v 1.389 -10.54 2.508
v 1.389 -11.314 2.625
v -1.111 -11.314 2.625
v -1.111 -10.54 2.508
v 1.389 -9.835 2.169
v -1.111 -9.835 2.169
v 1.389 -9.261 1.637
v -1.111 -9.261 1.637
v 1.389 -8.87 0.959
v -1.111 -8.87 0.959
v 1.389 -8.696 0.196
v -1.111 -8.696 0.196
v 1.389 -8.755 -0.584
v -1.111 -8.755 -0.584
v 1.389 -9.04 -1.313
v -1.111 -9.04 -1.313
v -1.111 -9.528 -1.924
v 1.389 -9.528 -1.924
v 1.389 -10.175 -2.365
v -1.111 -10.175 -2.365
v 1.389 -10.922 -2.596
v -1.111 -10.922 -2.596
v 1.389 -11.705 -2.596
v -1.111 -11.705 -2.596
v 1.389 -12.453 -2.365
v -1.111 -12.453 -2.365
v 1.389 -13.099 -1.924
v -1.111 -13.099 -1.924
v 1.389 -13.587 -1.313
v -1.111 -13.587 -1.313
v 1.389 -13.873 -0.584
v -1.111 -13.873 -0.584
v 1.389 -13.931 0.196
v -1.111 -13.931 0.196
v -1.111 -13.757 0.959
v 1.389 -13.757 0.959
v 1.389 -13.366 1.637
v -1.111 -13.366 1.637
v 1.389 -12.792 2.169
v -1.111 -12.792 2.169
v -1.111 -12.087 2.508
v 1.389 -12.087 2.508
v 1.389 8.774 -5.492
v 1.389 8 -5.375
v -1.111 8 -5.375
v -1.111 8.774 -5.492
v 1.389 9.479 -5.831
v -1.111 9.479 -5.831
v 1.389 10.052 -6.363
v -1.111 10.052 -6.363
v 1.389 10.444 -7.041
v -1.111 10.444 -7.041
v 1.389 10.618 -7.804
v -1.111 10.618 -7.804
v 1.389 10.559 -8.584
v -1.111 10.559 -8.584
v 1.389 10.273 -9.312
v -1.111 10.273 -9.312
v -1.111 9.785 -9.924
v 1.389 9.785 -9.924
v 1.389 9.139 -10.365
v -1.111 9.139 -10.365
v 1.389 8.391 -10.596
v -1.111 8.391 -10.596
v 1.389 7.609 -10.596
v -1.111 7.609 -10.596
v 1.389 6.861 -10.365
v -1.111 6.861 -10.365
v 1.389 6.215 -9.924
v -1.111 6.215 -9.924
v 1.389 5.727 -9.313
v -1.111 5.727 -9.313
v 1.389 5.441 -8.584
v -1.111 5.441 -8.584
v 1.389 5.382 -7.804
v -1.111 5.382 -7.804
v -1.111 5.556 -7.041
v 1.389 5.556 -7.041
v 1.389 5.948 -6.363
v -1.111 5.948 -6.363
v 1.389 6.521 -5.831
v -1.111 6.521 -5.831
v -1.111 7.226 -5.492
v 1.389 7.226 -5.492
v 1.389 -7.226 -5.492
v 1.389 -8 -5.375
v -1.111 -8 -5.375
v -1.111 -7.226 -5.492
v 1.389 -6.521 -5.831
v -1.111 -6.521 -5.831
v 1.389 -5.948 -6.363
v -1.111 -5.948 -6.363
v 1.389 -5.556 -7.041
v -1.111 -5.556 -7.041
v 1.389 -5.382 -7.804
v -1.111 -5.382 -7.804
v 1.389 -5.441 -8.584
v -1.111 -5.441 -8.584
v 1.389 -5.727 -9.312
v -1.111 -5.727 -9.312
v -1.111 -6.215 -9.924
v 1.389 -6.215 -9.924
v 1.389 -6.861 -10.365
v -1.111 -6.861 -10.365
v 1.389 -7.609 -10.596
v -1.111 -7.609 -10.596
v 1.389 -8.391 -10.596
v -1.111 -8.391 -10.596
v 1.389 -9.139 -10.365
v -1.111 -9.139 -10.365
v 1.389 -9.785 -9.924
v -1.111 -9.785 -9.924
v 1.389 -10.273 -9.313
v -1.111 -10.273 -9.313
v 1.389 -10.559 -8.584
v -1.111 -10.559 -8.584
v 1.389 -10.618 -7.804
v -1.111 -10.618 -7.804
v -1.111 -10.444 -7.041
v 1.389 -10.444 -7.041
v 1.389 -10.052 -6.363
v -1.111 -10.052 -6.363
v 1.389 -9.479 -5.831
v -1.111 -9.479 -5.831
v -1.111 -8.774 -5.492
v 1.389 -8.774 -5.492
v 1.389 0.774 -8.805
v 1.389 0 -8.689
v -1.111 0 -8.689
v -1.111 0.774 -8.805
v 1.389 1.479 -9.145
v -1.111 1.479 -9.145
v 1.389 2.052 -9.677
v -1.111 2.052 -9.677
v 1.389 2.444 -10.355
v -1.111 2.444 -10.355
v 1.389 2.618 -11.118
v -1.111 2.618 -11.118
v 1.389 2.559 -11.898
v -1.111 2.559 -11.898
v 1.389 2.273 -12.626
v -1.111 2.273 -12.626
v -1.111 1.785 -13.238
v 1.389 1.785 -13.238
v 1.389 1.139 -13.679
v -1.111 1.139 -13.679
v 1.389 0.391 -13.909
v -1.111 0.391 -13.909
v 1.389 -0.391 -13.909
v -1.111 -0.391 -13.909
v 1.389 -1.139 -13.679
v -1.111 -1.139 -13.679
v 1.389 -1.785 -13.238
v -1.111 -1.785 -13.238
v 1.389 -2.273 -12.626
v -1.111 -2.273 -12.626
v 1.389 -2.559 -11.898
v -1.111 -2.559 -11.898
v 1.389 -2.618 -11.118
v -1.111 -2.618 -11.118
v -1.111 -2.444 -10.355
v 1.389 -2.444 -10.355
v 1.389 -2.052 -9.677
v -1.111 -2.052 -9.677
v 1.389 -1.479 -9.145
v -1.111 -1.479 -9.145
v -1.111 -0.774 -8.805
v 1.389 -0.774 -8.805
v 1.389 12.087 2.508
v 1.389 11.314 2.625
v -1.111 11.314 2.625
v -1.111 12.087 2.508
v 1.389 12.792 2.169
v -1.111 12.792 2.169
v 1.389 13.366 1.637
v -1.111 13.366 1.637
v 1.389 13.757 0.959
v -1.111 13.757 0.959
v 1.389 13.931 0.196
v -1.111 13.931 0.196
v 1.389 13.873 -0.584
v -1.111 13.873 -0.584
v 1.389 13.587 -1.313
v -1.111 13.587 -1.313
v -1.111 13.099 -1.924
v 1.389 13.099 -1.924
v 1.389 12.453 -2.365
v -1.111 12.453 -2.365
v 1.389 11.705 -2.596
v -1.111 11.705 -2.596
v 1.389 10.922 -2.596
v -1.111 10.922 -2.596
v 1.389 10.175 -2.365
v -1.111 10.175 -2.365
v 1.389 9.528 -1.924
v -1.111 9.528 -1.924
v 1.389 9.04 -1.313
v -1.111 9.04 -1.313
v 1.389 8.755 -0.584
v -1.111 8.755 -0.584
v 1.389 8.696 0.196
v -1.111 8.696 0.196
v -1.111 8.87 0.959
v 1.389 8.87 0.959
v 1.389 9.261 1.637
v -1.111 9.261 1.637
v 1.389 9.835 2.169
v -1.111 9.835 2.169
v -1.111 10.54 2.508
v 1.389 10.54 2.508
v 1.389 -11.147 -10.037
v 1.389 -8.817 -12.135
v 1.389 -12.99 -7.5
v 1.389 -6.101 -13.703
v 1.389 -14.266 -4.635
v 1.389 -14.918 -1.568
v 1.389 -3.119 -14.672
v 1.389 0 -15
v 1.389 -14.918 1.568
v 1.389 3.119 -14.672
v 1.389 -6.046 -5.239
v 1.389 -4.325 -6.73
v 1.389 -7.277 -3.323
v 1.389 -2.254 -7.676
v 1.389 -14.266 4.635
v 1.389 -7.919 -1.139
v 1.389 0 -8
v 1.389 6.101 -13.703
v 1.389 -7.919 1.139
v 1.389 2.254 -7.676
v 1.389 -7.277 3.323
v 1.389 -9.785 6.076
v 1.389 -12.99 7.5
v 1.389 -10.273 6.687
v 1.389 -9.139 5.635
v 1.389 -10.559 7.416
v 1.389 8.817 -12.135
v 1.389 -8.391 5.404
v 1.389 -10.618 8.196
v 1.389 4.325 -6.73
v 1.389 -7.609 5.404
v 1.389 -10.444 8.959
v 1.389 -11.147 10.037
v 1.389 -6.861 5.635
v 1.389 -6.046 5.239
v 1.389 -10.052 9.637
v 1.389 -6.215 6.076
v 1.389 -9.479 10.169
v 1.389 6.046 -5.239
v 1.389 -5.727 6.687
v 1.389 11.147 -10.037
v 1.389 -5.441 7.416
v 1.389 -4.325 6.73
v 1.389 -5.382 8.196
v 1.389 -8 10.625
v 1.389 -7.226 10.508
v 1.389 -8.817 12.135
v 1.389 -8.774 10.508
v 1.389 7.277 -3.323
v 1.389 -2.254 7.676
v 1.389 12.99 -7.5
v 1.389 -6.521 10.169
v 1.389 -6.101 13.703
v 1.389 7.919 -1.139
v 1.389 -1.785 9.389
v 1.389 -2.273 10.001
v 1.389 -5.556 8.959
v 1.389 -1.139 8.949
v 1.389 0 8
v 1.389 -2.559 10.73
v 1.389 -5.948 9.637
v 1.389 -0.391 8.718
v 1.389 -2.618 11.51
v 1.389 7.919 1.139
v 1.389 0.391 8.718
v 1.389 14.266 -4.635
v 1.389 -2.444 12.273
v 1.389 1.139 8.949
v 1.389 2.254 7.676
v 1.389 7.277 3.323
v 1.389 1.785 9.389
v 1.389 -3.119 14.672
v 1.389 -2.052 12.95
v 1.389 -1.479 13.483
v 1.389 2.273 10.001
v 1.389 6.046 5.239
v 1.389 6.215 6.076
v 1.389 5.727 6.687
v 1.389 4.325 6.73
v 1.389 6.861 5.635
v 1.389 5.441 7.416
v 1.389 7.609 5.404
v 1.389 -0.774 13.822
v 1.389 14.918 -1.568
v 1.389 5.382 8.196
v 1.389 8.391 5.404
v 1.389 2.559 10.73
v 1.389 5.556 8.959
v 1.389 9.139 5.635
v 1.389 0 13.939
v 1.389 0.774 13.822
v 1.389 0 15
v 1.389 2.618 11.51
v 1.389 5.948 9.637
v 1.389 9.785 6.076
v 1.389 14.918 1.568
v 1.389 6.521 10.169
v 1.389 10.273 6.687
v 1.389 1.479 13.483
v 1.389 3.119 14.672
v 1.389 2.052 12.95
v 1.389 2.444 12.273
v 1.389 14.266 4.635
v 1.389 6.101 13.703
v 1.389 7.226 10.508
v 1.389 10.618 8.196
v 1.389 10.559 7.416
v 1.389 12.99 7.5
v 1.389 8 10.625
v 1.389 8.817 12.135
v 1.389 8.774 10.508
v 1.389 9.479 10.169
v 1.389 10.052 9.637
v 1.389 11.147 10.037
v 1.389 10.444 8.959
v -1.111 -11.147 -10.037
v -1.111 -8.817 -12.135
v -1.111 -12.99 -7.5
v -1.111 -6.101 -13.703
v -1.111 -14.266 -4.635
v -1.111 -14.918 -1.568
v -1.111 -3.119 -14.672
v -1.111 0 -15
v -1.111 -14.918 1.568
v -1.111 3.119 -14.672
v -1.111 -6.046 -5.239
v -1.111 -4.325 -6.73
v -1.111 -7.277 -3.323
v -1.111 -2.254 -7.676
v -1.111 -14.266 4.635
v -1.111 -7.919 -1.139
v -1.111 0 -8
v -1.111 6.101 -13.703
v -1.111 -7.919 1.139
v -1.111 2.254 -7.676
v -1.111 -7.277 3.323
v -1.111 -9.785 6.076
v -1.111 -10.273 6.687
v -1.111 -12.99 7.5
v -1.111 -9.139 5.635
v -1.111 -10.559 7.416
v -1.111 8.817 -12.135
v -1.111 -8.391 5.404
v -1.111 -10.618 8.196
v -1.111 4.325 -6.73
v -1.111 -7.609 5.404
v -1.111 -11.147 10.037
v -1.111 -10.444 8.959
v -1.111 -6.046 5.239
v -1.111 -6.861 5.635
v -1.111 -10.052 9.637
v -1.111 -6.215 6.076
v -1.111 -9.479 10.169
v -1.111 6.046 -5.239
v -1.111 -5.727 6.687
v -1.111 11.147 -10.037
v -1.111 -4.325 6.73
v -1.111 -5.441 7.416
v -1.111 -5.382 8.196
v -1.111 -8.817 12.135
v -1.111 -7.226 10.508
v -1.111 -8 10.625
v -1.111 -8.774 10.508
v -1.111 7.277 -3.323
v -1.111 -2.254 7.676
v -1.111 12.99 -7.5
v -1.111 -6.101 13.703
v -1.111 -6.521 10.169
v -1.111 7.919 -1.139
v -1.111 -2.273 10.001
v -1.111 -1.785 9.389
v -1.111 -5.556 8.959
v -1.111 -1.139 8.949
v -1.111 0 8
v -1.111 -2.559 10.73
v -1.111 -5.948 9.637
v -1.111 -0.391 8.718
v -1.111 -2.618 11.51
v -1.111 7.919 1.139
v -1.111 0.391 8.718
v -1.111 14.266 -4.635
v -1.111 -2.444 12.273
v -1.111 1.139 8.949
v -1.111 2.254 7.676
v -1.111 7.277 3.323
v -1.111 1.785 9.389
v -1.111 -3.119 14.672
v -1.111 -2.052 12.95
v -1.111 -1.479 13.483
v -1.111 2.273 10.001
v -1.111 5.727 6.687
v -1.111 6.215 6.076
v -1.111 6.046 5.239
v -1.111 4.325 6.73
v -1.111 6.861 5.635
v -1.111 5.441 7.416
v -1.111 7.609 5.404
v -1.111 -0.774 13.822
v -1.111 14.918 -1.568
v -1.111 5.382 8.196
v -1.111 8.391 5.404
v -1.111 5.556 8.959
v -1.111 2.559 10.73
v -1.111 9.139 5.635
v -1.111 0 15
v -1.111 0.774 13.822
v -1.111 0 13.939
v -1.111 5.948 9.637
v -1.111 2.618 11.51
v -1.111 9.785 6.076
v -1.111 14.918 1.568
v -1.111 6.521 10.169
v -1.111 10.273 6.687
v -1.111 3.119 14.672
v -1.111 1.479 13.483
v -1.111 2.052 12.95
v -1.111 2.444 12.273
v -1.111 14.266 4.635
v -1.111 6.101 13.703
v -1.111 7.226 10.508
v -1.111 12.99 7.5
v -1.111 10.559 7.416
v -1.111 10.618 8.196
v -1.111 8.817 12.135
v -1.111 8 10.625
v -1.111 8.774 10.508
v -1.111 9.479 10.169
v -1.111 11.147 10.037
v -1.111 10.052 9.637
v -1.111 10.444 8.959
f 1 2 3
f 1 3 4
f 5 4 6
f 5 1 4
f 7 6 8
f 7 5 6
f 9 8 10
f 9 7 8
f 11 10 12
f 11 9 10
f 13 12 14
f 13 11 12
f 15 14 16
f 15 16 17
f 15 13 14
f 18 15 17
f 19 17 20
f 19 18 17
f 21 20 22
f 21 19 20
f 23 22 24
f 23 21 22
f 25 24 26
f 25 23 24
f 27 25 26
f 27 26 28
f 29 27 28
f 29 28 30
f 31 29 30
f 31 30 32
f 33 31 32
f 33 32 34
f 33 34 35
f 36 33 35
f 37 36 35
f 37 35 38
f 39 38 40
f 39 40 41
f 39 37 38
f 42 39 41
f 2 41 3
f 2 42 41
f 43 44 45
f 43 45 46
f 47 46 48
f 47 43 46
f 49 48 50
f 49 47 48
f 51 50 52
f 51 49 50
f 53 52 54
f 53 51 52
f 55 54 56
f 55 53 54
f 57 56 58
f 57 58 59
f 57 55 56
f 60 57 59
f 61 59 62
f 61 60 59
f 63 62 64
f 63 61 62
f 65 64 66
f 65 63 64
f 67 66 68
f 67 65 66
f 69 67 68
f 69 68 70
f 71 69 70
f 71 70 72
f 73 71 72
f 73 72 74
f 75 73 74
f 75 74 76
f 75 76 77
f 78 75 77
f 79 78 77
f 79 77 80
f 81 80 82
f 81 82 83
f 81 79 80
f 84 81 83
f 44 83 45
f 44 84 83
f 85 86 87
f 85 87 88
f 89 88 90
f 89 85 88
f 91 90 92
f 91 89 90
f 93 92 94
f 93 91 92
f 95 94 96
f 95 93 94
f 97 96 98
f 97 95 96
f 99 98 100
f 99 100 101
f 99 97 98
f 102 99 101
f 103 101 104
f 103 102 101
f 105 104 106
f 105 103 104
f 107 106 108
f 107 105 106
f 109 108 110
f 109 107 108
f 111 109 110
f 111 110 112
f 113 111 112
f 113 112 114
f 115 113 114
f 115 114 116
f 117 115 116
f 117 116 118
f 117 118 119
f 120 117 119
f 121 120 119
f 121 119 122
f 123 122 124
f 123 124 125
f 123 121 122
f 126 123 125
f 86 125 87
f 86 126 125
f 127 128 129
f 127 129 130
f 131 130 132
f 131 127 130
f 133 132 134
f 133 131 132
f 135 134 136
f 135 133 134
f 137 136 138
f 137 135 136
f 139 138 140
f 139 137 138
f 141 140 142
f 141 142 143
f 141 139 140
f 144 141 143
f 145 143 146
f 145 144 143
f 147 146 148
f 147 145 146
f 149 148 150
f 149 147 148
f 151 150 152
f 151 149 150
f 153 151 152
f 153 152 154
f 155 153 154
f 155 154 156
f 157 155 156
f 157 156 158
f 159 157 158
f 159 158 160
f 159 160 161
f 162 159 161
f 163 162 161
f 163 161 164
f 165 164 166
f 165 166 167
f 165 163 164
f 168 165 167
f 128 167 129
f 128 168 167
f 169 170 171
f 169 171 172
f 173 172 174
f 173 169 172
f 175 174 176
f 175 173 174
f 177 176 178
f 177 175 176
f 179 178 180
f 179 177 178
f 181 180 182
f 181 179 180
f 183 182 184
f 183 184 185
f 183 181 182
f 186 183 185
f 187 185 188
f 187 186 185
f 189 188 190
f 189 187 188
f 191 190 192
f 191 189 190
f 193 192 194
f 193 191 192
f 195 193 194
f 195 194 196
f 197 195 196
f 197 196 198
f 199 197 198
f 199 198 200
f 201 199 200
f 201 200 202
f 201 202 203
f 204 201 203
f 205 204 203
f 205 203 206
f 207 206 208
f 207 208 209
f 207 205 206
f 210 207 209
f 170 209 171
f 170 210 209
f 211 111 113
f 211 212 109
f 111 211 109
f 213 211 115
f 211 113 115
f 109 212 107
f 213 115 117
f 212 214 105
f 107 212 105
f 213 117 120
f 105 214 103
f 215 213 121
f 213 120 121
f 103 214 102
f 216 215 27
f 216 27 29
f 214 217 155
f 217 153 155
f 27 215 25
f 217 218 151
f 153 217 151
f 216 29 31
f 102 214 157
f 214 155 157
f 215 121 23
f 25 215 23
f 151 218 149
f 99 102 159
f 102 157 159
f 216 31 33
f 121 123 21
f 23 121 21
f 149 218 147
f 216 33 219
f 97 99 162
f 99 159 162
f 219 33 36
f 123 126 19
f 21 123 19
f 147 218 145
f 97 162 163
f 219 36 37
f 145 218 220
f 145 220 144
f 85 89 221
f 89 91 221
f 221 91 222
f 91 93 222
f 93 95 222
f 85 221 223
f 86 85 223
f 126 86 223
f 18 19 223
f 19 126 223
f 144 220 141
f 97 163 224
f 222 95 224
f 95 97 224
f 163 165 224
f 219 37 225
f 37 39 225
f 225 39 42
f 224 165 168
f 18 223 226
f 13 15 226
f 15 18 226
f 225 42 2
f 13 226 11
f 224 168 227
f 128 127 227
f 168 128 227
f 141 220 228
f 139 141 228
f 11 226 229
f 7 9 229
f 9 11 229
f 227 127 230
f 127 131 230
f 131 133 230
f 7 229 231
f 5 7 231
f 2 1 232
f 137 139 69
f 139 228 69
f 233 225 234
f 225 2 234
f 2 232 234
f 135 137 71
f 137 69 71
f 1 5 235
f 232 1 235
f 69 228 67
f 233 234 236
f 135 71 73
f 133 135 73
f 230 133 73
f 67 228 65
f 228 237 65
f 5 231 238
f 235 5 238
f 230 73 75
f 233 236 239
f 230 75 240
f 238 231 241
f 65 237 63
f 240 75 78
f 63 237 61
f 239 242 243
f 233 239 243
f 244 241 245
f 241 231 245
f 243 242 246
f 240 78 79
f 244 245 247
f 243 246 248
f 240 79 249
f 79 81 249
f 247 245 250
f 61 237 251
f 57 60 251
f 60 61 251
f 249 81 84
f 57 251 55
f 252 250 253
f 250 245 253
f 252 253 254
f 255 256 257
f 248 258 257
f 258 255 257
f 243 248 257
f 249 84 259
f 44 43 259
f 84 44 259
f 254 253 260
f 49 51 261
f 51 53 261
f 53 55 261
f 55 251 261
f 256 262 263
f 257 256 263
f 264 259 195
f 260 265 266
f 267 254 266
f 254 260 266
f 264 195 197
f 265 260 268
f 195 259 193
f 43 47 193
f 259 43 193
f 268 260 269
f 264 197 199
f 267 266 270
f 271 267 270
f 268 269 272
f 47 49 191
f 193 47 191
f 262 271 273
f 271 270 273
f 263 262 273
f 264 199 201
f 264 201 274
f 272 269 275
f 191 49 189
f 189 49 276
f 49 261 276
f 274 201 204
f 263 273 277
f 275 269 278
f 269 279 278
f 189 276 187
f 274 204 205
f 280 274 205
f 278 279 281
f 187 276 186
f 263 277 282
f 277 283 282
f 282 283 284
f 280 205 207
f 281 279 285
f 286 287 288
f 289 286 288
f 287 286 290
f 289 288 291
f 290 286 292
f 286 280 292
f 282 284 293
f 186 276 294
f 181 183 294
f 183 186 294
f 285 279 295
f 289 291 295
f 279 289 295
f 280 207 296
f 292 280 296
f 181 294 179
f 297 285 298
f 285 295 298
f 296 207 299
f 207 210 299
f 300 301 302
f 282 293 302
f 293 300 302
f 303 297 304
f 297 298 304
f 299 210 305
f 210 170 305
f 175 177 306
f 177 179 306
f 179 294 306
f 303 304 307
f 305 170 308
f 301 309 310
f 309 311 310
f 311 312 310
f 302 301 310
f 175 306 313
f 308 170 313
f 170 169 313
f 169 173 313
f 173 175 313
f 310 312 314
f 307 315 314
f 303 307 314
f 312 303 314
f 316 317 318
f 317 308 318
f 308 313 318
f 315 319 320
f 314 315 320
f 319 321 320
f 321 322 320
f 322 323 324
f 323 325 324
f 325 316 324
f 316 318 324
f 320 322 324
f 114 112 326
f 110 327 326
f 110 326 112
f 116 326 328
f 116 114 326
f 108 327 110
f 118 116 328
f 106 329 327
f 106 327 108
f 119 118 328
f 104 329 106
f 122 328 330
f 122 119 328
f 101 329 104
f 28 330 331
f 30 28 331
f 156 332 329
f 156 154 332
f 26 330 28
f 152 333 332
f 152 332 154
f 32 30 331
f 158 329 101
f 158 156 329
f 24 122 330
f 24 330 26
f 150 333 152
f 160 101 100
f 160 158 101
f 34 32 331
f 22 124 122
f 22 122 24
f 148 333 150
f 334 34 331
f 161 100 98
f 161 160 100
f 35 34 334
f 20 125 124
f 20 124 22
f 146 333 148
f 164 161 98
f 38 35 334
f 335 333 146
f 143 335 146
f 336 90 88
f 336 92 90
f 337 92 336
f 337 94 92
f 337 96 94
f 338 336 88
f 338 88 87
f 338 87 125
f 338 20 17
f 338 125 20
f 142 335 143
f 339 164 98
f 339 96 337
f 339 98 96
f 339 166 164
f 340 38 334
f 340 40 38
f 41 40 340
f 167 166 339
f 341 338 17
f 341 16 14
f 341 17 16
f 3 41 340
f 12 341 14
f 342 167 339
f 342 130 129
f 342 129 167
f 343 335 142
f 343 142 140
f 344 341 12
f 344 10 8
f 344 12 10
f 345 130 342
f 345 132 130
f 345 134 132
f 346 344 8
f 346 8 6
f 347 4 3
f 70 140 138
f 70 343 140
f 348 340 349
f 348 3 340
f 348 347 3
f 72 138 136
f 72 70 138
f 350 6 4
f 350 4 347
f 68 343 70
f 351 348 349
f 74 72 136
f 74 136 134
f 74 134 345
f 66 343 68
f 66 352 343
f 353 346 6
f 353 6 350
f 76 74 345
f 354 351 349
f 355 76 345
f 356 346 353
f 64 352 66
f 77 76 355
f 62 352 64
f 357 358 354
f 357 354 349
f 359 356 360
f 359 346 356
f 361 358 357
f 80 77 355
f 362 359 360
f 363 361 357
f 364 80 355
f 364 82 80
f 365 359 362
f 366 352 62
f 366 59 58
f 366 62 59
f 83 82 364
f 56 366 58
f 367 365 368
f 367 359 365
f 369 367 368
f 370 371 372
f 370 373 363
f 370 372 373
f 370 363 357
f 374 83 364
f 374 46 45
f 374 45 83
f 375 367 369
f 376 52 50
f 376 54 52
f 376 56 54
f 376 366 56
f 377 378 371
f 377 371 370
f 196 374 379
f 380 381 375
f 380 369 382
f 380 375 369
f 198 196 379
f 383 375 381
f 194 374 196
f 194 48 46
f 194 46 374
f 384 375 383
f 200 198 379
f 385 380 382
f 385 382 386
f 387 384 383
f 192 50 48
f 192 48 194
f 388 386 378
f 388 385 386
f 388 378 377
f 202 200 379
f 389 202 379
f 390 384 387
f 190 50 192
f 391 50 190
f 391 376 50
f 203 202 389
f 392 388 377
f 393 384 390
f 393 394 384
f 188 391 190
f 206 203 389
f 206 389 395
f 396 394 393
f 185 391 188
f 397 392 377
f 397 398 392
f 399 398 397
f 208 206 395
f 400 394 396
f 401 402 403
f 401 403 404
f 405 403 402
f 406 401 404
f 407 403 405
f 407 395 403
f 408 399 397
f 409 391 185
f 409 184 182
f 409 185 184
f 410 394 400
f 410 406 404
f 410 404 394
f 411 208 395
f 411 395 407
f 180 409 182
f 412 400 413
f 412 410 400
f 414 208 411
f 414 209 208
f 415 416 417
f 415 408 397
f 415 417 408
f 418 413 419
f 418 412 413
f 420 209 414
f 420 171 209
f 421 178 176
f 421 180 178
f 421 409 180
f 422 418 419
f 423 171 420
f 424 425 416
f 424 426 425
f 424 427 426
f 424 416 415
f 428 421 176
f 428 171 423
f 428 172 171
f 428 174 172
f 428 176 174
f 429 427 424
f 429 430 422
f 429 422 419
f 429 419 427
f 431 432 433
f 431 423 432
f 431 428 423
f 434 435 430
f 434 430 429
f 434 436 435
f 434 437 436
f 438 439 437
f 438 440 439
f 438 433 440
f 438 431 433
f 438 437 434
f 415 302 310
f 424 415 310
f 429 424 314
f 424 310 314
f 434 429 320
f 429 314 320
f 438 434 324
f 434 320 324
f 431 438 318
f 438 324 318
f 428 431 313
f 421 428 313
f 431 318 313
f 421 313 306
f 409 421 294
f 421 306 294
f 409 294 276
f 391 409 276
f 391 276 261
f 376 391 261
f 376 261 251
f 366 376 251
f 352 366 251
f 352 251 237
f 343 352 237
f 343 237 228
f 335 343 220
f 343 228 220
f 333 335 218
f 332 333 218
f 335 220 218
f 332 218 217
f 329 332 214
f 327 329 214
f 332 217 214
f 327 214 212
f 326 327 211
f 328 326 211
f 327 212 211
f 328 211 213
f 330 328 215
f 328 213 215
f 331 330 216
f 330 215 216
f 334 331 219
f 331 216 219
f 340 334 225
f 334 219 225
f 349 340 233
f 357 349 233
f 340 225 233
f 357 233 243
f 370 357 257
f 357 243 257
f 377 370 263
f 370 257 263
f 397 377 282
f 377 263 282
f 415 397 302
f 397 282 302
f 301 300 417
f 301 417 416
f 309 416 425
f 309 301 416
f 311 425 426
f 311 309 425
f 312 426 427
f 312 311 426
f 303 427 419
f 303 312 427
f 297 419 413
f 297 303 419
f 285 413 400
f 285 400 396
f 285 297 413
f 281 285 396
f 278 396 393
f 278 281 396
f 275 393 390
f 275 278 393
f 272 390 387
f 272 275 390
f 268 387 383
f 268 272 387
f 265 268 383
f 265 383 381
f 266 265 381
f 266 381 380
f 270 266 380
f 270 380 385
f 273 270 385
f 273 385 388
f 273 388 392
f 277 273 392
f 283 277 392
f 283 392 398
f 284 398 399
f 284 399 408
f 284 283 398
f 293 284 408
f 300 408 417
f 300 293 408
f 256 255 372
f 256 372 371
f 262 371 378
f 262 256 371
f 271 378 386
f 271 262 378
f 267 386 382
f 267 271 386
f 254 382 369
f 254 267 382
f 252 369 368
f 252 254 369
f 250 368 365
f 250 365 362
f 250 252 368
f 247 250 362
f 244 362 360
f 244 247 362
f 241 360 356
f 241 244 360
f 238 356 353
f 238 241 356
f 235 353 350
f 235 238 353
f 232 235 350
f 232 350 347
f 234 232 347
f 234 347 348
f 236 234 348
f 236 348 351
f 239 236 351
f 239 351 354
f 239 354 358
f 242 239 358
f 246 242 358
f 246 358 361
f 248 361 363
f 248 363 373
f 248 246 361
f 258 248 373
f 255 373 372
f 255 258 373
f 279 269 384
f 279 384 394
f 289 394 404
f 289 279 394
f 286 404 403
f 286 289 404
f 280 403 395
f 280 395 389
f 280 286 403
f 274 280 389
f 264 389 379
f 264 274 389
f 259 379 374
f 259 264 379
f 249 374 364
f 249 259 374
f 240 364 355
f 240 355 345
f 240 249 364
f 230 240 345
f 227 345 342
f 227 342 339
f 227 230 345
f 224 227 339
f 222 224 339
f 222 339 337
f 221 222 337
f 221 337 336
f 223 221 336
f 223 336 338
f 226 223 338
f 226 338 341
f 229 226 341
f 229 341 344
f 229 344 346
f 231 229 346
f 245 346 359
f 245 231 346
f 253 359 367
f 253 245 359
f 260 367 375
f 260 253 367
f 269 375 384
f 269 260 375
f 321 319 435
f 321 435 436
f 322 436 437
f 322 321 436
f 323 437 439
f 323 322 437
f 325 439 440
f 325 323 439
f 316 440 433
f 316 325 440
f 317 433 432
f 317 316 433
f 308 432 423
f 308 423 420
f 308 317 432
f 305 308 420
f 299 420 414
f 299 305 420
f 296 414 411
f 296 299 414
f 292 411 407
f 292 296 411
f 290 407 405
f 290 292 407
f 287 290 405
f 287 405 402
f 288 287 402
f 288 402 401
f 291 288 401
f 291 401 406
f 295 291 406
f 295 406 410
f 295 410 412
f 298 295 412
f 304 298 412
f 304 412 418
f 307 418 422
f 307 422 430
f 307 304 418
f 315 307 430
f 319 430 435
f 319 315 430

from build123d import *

# Parameters (mm, degrees)
SKETCH7_R           = 15
SKETCH7_R_2         = 2.625
SKETCH7_R_3         = 8
BOSS_EXTRUDE1_DEPTH = 2.5


# Read off the part's stored shape, not the designer's step: 211-0022 (28 Tooth Bevel Gear).STEP<1>
with BuildPart() as part:
    # Sketch7 → Boss-Extrude1 (new body)
    with BuildSketch(Plane.ZY.offset(-1.3887)):
        Circle(SKETCH7_R)
        with Locations((-8, 8)):
            Circle(SKETCH7_R_2, mode=Mode.SUBTRACT)
        with Locations((-11.313708499, 0)):
            Circle(SKETCH7_R_2, mode=Mode.SUBTRACT)
        with Locations((-8, -8)):
            Circle(SKETCH7_R_2, mode=Mode.SUBTRACT)
        with Locations((0, -11.313708499)):
            Circle(SKETCH7_R_2, mode=Mode.SUBTRACT)
        with Locations((8, -8)):
            Circle(SKETCH7_R_2, mode=Mode.SUBTRACT)
        with Locations((11.313708499, 0)):
            Circle(SKETCH7_R_2, mode=Mode.SUBTRACT)
        with Locations((8, 8)):
            Circle(SKETCH7_R_2, mode=Mode.SUBTRACT)
        with Locations((0, 11.313708499)):
            Circle(SKETCH7_R_2, mode=Mode.SUBTRACT)
        Circle(SKETCH7_R_3, mode=Mode.SUBTRACT)
    extrude(amount=BOSS_EXTRUDE1_DEPTH)


solid = part.part
